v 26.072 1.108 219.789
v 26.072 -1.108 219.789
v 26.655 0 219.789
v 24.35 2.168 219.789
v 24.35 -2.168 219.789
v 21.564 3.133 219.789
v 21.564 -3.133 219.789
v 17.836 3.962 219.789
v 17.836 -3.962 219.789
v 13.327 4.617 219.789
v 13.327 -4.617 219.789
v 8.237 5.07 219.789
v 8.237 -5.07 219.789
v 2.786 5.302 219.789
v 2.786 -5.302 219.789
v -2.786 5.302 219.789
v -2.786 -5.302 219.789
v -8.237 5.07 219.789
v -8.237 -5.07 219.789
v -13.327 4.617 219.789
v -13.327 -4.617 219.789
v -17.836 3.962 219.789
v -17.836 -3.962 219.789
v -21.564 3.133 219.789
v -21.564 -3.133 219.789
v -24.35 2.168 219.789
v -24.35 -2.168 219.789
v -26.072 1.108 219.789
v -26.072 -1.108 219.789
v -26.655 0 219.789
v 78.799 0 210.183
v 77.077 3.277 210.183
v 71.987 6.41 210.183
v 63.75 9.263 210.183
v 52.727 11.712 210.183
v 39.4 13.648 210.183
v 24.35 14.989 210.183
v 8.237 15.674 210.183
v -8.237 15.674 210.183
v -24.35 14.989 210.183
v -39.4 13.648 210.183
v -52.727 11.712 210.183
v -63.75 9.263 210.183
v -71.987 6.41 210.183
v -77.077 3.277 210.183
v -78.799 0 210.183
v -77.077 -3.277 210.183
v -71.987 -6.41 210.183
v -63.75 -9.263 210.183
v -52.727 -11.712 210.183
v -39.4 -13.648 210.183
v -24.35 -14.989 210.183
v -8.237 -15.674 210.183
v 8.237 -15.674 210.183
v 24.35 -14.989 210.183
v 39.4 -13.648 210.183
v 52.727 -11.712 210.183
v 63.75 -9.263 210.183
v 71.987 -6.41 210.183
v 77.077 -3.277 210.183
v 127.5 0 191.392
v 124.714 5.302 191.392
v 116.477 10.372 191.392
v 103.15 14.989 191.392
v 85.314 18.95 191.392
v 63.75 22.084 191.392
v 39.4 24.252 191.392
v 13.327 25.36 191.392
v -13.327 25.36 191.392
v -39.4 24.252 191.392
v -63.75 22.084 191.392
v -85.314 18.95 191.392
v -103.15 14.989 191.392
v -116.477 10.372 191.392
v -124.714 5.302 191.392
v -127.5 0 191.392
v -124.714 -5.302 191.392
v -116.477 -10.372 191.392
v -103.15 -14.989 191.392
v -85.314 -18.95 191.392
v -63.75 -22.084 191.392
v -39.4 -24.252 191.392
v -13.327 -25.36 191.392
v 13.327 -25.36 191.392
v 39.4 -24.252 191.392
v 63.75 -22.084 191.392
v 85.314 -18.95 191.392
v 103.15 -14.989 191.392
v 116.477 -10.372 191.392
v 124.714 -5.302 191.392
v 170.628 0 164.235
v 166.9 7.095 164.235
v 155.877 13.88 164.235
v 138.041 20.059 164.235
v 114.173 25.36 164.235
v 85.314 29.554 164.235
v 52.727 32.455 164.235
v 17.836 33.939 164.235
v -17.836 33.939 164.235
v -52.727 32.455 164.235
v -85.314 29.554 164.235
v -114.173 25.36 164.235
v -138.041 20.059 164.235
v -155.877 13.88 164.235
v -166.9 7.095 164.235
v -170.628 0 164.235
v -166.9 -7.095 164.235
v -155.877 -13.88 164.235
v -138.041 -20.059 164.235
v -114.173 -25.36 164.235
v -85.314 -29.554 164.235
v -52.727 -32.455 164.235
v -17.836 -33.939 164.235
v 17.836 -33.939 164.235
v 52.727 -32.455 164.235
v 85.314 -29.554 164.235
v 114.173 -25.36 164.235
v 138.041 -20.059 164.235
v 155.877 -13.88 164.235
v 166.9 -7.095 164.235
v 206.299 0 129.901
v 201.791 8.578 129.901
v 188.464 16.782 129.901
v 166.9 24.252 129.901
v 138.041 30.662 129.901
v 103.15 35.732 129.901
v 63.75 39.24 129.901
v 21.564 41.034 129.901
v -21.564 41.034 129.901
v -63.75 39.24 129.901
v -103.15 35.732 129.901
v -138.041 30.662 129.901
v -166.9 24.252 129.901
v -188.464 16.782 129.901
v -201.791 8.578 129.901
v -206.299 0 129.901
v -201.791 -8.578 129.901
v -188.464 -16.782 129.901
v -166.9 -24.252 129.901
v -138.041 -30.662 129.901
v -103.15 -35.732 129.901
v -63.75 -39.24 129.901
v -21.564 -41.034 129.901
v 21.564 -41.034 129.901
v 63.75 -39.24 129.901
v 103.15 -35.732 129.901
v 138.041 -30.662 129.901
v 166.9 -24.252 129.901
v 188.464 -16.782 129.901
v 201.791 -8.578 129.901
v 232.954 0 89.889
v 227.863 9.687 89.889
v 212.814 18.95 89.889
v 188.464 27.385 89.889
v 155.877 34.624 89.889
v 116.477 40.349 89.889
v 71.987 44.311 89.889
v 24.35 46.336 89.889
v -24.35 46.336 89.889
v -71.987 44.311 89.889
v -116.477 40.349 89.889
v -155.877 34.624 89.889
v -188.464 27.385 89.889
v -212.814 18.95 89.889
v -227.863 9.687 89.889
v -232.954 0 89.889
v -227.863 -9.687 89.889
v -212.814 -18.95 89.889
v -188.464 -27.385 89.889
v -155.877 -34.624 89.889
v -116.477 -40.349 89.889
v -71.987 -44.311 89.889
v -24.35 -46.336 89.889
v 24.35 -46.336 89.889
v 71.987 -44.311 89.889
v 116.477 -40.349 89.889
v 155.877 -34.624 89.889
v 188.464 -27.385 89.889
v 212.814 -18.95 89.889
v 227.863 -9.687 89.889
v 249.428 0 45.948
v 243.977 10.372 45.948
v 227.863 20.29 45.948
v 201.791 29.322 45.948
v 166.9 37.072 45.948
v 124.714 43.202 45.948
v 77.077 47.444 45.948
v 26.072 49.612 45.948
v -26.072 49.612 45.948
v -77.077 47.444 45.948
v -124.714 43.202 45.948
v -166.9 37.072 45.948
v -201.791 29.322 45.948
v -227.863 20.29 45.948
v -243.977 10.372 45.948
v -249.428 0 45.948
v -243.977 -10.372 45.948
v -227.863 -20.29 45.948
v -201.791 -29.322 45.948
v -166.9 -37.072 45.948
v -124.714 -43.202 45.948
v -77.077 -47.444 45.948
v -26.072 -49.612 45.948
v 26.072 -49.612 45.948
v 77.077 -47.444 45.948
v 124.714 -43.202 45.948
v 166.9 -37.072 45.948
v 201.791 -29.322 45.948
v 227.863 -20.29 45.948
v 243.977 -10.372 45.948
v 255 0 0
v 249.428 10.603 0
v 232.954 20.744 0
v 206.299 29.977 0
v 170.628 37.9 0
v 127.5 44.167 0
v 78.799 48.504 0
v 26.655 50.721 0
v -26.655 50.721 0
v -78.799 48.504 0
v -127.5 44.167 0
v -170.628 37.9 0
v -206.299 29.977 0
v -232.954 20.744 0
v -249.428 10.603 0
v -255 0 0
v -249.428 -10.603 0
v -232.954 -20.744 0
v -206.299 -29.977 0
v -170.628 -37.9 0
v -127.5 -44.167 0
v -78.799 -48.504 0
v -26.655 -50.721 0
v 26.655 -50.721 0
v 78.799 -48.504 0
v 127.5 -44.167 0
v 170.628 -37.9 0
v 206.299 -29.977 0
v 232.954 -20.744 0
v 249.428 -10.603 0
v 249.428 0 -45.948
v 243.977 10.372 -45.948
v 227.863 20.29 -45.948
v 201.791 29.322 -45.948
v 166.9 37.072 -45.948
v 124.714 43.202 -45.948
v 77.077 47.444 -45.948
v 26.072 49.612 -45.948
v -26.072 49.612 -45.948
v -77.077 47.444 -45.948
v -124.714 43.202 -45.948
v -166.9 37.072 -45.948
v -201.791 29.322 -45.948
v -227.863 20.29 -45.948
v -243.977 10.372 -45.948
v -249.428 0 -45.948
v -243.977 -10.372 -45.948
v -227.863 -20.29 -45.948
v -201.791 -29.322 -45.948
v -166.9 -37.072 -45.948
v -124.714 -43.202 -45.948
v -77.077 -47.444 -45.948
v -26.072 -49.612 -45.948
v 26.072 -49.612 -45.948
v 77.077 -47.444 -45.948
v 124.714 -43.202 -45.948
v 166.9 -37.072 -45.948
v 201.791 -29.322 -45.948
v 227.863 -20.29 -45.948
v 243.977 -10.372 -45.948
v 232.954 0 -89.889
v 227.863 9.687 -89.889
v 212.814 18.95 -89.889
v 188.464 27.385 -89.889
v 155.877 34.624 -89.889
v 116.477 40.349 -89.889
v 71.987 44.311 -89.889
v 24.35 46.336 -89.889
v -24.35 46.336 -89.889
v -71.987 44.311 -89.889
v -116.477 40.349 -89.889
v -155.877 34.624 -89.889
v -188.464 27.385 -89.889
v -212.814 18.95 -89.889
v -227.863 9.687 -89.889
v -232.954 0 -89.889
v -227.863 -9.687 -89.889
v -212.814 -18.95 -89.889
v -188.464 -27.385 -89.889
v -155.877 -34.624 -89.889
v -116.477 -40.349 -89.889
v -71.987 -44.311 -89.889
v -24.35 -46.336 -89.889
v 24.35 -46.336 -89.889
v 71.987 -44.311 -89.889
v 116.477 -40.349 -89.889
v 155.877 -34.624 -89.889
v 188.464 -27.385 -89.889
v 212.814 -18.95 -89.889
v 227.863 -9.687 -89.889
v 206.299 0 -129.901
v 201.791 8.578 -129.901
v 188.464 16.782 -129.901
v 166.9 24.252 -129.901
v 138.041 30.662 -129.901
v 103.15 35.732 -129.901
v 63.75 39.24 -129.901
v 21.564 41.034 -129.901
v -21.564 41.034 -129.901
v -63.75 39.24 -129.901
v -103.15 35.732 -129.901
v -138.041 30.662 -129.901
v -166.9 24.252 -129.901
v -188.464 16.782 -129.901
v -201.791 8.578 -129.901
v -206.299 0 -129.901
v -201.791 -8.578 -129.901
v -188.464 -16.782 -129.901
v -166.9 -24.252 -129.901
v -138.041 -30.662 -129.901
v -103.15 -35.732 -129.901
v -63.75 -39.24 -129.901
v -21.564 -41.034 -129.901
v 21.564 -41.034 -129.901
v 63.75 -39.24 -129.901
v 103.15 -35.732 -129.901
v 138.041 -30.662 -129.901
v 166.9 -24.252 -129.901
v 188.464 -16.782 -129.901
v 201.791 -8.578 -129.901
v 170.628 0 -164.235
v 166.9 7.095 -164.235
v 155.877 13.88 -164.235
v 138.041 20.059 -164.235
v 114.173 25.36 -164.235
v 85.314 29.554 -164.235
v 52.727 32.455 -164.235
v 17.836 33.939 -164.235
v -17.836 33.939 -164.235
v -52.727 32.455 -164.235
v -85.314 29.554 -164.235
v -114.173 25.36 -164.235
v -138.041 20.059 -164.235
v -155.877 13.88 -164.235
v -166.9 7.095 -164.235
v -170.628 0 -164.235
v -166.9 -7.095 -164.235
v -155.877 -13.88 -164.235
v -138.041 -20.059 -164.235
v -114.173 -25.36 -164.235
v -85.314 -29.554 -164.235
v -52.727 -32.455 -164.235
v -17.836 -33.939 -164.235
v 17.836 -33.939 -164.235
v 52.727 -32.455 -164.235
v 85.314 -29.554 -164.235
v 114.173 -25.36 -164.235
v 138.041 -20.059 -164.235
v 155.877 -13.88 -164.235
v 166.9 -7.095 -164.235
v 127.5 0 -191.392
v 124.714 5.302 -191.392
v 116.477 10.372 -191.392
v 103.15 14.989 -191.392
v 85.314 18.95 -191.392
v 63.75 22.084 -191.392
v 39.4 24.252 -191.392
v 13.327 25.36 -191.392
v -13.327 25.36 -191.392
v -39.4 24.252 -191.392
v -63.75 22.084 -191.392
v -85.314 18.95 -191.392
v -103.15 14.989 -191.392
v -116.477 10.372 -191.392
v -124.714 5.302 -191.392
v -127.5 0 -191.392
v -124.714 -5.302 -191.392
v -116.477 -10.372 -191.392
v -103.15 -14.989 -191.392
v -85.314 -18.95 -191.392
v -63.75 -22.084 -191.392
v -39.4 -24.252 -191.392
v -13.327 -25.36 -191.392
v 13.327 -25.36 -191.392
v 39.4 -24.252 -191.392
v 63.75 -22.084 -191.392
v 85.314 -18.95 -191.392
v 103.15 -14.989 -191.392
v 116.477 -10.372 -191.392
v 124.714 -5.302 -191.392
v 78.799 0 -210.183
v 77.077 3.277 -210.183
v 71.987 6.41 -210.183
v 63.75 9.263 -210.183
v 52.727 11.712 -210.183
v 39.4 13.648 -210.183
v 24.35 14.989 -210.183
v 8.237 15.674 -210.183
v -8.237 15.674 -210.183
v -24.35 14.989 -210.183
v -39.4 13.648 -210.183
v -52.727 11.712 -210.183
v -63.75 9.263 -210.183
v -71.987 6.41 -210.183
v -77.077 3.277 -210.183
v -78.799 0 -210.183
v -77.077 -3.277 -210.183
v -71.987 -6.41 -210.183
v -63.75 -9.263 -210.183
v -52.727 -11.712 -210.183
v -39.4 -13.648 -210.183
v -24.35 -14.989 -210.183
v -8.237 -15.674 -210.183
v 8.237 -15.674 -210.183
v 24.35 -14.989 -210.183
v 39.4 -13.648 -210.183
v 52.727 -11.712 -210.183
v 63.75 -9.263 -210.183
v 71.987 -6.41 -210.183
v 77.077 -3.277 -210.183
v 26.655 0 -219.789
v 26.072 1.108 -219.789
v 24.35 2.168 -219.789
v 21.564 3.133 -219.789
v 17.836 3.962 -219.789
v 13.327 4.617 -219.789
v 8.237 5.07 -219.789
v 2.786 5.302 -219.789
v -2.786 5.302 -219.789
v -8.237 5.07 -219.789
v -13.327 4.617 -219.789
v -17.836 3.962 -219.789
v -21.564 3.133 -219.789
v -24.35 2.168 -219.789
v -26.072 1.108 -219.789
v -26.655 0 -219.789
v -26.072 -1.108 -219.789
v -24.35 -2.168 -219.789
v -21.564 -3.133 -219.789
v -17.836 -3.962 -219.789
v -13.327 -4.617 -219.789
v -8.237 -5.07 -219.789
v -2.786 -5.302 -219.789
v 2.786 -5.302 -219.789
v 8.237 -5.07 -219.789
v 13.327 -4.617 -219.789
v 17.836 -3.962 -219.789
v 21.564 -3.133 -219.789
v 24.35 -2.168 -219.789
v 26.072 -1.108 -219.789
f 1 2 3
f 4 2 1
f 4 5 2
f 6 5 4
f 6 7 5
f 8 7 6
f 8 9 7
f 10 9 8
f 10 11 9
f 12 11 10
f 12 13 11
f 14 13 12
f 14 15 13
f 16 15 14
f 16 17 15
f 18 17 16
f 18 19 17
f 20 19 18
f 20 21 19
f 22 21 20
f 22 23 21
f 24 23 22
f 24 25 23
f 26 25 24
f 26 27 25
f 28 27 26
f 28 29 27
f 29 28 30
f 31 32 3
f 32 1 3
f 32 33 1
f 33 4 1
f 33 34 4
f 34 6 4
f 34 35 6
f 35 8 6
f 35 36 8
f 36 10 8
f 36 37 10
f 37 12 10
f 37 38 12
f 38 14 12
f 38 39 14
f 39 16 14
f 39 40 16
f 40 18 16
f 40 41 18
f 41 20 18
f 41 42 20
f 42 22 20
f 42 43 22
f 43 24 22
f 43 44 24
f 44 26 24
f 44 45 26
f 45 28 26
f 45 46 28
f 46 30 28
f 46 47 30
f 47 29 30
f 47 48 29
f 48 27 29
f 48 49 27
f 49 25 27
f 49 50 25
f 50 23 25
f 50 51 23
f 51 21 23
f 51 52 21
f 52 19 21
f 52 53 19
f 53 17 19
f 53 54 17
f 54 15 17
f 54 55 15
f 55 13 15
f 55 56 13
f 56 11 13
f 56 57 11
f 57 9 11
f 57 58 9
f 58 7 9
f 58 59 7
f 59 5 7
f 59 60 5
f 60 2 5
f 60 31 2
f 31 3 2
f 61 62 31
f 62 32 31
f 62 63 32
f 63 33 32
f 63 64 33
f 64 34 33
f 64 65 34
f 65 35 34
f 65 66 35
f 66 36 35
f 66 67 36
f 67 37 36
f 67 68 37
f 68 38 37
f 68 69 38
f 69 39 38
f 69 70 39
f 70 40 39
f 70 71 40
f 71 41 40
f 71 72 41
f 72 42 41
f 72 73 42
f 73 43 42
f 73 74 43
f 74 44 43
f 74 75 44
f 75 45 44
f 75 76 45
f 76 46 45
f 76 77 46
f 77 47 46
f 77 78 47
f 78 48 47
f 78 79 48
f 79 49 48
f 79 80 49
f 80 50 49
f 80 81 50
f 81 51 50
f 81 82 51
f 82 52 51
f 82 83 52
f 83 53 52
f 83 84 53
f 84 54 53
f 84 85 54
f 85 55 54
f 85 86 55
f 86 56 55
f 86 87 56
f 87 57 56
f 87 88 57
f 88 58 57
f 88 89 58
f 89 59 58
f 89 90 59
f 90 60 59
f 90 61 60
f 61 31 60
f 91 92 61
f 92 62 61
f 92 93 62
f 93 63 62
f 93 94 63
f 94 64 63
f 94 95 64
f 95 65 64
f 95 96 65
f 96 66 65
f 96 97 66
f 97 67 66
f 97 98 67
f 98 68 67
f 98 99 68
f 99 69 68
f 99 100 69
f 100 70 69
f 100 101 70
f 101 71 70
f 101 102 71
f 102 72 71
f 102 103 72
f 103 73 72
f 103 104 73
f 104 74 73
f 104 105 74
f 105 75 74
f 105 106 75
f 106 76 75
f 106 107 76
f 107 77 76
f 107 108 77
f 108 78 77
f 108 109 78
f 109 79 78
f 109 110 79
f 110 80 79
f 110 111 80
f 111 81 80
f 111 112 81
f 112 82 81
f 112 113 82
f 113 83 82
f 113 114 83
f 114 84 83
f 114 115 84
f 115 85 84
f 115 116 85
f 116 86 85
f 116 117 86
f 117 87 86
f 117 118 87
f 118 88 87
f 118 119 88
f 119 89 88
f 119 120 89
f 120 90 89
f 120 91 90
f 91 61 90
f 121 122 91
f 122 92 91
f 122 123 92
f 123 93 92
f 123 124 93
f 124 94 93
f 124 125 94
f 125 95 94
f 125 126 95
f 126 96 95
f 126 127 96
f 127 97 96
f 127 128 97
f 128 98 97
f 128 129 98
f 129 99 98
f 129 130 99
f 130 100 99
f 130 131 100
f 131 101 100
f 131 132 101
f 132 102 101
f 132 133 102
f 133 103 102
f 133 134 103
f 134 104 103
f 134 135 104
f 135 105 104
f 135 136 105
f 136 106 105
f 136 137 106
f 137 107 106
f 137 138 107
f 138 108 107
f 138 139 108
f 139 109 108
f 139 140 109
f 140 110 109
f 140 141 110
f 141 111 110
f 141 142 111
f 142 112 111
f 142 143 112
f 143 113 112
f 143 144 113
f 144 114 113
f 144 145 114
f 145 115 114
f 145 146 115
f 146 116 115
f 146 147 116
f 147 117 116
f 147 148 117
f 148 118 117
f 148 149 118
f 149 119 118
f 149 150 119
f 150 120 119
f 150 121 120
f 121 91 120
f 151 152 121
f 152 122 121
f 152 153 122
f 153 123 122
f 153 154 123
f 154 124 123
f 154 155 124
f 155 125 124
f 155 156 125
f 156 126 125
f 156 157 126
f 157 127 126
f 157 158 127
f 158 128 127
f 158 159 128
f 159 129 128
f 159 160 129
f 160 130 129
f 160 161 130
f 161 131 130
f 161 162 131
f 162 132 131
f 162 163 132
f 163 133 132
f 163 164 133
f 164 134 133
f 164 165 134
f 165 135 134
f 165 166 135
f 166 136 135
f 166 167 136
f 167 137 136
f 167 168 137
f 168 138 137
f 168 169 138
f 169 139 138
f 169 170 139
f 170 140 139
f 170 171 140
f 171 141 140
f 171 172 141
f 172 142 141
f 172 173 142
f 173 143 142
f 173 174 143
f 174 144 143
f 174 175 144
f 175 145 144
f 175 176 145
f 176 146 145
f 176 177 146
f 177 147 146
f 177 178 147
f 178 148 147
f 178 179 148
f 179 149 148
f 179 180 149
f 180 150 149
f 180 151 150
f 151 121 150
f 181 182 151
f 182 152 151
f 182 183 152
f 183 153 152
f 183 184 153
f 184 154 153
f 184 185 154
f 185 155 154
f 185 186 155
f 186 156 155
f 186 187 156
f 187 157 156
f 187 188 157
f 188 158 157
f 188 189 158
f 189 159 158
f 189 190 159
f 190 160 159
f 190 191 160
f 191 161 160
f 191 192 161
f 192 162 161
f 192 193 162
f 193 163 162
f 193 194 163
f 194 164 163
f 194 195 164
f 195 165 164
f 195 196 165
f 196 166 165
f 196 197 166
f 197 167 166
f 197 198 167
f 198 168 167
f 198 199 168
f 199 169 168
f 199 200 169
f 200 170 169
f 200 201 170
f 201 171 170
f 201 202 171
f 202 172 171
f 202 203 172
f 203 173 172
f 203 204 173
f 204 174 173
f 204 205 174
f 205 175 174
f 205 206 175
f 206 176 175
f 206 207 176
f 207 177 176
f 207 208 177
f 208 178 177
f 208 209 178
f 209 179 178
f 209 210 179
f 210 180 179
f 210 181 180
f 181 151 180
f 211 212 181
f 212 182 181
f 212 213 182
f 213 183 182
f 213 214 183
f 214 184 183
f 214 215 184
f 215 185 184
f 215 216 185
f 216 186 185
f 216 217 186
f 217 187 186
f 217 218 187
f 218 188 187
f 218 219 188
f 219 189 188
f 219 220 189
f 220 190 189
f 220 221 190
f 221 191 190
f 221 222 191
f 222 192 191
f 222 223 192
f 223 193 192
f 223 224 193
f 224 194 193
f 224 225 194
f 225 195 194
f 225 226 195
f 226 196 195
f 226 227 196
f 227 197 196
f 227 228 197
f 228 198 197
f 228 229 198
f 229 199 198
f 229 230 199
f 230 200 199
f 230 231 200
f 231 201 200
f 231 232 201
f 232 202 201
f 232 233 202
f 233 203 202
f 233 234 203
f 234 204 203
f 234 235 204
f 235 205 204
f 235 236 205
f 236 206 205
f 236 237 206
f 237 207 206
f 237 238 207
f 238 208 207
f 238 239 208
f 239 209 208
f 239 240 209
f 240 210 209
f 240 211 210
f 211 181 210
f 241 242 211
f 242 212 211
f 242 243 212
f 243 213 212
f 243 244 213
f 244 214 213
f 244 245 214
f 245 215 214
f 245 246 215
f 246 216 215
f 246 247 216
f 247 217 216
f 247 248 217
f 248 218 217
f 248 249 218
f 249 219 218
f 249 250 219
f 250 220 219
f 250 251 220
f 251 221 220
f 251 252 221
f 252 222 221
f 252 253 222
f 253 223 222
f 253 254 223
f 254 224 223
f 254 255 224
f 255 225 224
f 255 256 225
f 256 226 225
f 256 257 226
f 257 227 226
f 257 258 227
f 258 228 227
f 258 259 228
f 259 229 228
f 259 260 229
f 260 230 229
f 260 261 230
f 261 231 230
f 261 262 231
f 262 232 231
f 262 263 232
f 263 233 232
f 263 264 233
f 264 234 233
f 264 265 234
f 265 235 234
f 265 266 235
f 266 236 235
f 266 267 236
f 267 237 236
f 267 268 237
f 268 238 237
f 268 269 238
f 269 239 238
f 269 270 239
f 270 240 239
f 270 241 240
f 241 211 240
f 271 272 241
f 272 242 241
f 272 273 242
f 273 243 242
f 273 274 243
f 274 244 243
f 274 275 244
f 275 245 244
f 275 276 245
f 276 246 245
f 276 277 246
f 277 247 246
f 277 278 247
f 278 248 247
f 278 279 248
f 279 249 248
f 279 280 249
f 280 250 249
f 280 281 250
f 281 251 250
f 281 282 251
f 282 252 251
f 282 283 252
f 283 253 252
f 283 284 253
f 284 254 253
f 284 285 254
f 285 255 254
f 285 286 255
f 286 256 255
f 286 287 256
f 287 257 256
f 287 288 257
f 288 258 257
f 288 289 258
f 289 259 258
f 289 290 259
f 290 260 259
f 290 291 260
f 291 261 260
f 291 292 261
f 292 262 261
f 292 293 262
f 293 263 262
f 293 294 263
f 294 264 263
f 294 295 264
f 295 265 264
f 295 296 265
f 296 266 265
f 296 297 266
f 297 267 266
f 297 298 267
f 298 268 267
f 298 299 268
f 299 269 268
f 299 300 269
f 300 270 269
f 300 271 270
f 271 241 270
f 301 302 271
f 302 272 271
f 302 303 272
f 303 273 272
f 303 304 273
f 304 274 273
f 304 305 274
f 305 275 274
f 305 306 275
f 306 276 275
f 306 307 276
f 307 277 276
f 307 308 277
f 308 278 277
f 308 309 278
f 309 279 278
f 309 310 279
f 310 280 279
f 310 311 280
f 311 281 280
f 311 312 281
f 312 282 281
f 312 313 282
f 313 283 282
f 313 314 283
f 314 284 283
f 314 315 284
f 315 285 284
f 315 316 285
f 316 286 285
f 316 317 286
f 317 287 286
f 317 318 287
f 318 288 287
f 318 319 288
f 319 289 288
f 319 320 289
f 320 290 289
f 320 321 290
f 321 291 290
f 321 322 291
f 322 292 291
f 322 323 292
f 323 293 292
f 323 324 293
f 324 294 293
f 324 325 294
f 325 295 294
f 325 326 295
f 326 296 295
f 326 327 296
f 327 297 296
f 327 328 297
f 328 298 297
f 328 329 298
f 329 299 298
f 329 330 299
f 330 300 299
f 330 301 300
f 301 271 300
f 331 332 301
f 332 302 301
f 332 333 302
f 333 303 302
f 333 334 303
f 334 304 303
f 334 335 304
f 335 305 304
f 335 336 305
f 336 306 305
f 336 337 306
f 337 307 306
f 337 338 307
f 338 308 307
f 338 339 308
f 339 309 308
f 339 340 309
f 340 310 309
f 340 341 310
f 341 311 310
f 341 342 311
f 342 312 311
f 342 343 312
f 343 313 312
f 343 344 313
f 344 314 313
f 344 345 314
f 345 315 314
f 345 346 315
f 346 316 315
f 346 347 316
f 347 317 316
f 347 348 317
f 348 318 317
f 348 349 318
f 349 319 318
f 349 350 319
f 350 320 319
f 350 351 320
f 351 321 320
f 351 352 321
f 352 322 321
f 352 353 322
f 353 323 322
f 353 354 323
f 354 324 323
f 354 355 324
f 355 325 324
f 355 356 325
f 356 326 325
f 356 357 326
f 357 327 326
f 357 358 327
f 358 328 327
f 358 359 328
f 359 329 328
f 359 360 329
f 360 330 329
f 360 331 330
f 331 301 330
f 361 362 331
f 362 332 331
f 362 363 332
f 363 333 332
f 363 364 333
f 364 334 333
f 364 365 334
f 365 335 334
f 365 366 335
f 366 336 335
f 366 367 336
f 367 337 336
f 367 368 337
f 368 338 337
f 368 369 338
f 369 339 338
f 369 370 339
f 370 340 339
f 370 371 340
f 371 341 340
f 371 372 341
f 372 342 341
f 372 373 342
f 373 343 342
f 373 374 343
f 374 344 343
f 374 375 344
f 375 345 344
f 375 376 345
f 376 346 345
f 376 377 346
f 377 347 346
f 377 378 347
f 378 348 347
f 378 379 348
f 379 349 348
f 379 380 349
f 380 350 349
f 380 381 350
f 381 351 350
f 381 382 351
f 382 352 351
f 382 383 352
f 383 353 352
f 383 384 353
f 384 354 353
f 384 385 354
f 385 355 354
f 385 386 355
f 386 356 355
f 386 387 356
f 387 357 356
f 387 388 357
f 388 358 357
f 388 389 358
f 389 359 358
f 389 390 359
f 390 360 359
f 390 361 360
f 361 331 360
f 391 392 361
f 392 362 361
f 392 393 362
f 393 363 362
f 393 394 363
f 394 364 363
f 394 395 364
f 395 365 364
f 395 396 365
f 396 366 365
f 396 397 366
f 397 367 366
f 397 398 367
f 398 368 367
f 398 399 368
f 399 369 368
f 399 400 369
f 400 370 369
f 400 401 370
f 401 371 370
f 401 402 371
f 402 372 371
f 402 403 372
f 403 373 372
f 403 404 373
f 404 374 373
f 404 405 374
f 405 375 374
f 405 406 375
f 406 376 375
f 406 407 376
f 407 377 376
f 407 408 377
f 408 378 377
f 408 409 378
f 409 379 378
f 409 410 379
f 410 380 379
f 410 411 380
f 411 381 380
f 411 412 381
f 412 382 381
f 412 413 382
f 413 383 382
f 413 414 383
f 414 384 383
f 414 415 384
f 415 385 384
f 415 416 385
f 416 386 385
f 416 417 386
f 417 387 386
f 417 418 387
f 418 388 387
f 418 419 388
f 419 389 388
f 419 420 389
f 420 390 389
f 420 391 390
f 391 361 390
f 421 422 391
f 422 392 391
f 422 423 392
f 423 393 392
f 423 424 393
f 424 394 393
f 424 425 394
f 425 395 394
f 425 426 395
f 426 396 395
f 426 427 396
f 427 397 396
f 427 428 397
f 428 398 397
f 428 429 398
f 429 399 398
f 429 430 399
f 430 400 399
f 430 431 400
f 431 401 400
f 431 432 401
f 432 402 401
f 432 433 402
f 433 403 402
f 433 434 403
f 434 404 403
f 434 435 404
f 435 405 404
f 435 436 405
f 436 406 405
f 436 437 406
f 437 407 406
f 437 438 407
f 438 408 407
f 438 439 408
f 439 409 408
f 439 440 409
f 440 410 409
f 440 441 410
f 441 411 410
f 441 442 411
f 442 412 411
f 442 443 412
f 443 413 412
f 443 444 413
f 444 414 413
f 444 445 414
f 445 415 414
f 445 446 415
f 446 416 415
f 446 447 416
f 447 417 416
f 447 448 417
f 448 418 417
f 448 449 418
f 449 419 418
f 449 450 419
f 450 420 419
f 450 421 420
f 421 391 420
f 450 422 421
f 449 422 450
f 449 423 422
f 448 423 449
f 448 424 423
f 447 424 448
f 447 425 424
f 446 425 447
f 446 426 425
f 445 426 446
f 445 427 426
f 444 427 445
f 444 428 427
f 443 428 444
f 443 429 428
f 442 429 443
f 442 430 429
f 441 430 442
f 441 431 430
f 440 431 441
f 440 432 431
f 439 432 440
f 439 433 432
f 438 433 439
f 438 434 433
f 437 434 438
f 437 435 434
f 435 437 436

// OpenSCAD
// Generated by SolidPython 1.0.1 on 2020-07-29 00:46:51


scale(v = [15, 3, 13]) {
	sphere(r = 17);
}
/***********************************************
*********      SolidPython code:      **********
************************************************
 
# import packages: SolidPython
from solid import *
from solid.utils import *
from itertools import chain, combinations, permutations


class Resize:

    def __init__(self, scad_file):
        self.scad_file = scad_file
        #self.scad_file = import_scad(scad_file)
        # cone/cylinder param:
        self.r1 = 0
        self.r2 = 0
        self.h = 0
        # rectangular prism param:
        self.w = 0
        self.l = 0
        # ellipse param:
        self.r = 0

    # import OpenScad code (file name corresponds to shape)


    # classify shape + parameters
    def assign(self, param1, param2, param3):
        if self.scad_file == 'cone.scad':
            self.r1 = param1
            self.r2 = param2
            self.h = param3
        elif self.scad_file == 'cylinder.scad':
            self.r1 = param1
            self.r2 = param2
            self.h = param3
        elif self.scad_file == 'rectangularPrism.scad':
            self.h = param1
            self.l = param2
            self.w = param3
        else:
            self.r = param1
            self.h = param2

    # resize parameters
    def iterate(self):
        x = range(3, 20, 2)
        i = 1
        if self.scad_file == 'cone.scad':
            tempList = list(permutations(x, 2))
            for temp in tempList:
                param1 = temp[0]
                param2 = temp[1]
                filepath = 'produced_scad_files/' + 'cone' + str(param1) + '_' + str(param2) + '_' + '.scad'
                scad_render_to_file(cylinder(h=param1, r1=param2, r2=0), filepath)

        elif self.scad_file == 'cylinder.scad':
            tempList = list(permutations(x, 3))
            for temp in tempList:
                param1 = temp[0]
                param2 = temp[1]
                filepath = 'produced_scad_files/' + 'cylinder' + str(param1) + '_' + str(param2) + '_' + '.scad'
                scad_render_to_file(cylinder(h=param1, r1=param2, r2=param2), filepath)

        elif self.scad_file == 'rectangularPrism.scad':
            tempList = list(permutations(x, 3))
            for temp in tempList:
                param1 = temp[0]
                param2 = temp[1]
                param3 = temp[2]
                filepath = 'produced_scad_files/' + 'rectangularPrism' + str(param1) + '_' + str(param2) + '_' + str(
                    param3) + '.scad'
                scad_render_to_file(cube(size=(param1, param2, param3)), filepath)

        elif self.scad_file == 'ellipse.scad':
            tempList = list(permutations(x, 4))
            for temp in tempList:
                param1 = temp[0]
                param2 = temp[1]
                param3 = temp[2]
                param4 = temp[3]
                filepath = 'produced_scad_files/' + 'ellipse' + str(param1) + '_' + str(param2) + '_' + str(param3) + '_' + str(param4) + '.scad'
                scad_render_to_file(scale([param1, param2, param3])(sphere(r=param4)), filepath)

    def render_to_scadfile(self):
        scad_render_to_file(scad, 'example.scad') 
 
************************************************/
